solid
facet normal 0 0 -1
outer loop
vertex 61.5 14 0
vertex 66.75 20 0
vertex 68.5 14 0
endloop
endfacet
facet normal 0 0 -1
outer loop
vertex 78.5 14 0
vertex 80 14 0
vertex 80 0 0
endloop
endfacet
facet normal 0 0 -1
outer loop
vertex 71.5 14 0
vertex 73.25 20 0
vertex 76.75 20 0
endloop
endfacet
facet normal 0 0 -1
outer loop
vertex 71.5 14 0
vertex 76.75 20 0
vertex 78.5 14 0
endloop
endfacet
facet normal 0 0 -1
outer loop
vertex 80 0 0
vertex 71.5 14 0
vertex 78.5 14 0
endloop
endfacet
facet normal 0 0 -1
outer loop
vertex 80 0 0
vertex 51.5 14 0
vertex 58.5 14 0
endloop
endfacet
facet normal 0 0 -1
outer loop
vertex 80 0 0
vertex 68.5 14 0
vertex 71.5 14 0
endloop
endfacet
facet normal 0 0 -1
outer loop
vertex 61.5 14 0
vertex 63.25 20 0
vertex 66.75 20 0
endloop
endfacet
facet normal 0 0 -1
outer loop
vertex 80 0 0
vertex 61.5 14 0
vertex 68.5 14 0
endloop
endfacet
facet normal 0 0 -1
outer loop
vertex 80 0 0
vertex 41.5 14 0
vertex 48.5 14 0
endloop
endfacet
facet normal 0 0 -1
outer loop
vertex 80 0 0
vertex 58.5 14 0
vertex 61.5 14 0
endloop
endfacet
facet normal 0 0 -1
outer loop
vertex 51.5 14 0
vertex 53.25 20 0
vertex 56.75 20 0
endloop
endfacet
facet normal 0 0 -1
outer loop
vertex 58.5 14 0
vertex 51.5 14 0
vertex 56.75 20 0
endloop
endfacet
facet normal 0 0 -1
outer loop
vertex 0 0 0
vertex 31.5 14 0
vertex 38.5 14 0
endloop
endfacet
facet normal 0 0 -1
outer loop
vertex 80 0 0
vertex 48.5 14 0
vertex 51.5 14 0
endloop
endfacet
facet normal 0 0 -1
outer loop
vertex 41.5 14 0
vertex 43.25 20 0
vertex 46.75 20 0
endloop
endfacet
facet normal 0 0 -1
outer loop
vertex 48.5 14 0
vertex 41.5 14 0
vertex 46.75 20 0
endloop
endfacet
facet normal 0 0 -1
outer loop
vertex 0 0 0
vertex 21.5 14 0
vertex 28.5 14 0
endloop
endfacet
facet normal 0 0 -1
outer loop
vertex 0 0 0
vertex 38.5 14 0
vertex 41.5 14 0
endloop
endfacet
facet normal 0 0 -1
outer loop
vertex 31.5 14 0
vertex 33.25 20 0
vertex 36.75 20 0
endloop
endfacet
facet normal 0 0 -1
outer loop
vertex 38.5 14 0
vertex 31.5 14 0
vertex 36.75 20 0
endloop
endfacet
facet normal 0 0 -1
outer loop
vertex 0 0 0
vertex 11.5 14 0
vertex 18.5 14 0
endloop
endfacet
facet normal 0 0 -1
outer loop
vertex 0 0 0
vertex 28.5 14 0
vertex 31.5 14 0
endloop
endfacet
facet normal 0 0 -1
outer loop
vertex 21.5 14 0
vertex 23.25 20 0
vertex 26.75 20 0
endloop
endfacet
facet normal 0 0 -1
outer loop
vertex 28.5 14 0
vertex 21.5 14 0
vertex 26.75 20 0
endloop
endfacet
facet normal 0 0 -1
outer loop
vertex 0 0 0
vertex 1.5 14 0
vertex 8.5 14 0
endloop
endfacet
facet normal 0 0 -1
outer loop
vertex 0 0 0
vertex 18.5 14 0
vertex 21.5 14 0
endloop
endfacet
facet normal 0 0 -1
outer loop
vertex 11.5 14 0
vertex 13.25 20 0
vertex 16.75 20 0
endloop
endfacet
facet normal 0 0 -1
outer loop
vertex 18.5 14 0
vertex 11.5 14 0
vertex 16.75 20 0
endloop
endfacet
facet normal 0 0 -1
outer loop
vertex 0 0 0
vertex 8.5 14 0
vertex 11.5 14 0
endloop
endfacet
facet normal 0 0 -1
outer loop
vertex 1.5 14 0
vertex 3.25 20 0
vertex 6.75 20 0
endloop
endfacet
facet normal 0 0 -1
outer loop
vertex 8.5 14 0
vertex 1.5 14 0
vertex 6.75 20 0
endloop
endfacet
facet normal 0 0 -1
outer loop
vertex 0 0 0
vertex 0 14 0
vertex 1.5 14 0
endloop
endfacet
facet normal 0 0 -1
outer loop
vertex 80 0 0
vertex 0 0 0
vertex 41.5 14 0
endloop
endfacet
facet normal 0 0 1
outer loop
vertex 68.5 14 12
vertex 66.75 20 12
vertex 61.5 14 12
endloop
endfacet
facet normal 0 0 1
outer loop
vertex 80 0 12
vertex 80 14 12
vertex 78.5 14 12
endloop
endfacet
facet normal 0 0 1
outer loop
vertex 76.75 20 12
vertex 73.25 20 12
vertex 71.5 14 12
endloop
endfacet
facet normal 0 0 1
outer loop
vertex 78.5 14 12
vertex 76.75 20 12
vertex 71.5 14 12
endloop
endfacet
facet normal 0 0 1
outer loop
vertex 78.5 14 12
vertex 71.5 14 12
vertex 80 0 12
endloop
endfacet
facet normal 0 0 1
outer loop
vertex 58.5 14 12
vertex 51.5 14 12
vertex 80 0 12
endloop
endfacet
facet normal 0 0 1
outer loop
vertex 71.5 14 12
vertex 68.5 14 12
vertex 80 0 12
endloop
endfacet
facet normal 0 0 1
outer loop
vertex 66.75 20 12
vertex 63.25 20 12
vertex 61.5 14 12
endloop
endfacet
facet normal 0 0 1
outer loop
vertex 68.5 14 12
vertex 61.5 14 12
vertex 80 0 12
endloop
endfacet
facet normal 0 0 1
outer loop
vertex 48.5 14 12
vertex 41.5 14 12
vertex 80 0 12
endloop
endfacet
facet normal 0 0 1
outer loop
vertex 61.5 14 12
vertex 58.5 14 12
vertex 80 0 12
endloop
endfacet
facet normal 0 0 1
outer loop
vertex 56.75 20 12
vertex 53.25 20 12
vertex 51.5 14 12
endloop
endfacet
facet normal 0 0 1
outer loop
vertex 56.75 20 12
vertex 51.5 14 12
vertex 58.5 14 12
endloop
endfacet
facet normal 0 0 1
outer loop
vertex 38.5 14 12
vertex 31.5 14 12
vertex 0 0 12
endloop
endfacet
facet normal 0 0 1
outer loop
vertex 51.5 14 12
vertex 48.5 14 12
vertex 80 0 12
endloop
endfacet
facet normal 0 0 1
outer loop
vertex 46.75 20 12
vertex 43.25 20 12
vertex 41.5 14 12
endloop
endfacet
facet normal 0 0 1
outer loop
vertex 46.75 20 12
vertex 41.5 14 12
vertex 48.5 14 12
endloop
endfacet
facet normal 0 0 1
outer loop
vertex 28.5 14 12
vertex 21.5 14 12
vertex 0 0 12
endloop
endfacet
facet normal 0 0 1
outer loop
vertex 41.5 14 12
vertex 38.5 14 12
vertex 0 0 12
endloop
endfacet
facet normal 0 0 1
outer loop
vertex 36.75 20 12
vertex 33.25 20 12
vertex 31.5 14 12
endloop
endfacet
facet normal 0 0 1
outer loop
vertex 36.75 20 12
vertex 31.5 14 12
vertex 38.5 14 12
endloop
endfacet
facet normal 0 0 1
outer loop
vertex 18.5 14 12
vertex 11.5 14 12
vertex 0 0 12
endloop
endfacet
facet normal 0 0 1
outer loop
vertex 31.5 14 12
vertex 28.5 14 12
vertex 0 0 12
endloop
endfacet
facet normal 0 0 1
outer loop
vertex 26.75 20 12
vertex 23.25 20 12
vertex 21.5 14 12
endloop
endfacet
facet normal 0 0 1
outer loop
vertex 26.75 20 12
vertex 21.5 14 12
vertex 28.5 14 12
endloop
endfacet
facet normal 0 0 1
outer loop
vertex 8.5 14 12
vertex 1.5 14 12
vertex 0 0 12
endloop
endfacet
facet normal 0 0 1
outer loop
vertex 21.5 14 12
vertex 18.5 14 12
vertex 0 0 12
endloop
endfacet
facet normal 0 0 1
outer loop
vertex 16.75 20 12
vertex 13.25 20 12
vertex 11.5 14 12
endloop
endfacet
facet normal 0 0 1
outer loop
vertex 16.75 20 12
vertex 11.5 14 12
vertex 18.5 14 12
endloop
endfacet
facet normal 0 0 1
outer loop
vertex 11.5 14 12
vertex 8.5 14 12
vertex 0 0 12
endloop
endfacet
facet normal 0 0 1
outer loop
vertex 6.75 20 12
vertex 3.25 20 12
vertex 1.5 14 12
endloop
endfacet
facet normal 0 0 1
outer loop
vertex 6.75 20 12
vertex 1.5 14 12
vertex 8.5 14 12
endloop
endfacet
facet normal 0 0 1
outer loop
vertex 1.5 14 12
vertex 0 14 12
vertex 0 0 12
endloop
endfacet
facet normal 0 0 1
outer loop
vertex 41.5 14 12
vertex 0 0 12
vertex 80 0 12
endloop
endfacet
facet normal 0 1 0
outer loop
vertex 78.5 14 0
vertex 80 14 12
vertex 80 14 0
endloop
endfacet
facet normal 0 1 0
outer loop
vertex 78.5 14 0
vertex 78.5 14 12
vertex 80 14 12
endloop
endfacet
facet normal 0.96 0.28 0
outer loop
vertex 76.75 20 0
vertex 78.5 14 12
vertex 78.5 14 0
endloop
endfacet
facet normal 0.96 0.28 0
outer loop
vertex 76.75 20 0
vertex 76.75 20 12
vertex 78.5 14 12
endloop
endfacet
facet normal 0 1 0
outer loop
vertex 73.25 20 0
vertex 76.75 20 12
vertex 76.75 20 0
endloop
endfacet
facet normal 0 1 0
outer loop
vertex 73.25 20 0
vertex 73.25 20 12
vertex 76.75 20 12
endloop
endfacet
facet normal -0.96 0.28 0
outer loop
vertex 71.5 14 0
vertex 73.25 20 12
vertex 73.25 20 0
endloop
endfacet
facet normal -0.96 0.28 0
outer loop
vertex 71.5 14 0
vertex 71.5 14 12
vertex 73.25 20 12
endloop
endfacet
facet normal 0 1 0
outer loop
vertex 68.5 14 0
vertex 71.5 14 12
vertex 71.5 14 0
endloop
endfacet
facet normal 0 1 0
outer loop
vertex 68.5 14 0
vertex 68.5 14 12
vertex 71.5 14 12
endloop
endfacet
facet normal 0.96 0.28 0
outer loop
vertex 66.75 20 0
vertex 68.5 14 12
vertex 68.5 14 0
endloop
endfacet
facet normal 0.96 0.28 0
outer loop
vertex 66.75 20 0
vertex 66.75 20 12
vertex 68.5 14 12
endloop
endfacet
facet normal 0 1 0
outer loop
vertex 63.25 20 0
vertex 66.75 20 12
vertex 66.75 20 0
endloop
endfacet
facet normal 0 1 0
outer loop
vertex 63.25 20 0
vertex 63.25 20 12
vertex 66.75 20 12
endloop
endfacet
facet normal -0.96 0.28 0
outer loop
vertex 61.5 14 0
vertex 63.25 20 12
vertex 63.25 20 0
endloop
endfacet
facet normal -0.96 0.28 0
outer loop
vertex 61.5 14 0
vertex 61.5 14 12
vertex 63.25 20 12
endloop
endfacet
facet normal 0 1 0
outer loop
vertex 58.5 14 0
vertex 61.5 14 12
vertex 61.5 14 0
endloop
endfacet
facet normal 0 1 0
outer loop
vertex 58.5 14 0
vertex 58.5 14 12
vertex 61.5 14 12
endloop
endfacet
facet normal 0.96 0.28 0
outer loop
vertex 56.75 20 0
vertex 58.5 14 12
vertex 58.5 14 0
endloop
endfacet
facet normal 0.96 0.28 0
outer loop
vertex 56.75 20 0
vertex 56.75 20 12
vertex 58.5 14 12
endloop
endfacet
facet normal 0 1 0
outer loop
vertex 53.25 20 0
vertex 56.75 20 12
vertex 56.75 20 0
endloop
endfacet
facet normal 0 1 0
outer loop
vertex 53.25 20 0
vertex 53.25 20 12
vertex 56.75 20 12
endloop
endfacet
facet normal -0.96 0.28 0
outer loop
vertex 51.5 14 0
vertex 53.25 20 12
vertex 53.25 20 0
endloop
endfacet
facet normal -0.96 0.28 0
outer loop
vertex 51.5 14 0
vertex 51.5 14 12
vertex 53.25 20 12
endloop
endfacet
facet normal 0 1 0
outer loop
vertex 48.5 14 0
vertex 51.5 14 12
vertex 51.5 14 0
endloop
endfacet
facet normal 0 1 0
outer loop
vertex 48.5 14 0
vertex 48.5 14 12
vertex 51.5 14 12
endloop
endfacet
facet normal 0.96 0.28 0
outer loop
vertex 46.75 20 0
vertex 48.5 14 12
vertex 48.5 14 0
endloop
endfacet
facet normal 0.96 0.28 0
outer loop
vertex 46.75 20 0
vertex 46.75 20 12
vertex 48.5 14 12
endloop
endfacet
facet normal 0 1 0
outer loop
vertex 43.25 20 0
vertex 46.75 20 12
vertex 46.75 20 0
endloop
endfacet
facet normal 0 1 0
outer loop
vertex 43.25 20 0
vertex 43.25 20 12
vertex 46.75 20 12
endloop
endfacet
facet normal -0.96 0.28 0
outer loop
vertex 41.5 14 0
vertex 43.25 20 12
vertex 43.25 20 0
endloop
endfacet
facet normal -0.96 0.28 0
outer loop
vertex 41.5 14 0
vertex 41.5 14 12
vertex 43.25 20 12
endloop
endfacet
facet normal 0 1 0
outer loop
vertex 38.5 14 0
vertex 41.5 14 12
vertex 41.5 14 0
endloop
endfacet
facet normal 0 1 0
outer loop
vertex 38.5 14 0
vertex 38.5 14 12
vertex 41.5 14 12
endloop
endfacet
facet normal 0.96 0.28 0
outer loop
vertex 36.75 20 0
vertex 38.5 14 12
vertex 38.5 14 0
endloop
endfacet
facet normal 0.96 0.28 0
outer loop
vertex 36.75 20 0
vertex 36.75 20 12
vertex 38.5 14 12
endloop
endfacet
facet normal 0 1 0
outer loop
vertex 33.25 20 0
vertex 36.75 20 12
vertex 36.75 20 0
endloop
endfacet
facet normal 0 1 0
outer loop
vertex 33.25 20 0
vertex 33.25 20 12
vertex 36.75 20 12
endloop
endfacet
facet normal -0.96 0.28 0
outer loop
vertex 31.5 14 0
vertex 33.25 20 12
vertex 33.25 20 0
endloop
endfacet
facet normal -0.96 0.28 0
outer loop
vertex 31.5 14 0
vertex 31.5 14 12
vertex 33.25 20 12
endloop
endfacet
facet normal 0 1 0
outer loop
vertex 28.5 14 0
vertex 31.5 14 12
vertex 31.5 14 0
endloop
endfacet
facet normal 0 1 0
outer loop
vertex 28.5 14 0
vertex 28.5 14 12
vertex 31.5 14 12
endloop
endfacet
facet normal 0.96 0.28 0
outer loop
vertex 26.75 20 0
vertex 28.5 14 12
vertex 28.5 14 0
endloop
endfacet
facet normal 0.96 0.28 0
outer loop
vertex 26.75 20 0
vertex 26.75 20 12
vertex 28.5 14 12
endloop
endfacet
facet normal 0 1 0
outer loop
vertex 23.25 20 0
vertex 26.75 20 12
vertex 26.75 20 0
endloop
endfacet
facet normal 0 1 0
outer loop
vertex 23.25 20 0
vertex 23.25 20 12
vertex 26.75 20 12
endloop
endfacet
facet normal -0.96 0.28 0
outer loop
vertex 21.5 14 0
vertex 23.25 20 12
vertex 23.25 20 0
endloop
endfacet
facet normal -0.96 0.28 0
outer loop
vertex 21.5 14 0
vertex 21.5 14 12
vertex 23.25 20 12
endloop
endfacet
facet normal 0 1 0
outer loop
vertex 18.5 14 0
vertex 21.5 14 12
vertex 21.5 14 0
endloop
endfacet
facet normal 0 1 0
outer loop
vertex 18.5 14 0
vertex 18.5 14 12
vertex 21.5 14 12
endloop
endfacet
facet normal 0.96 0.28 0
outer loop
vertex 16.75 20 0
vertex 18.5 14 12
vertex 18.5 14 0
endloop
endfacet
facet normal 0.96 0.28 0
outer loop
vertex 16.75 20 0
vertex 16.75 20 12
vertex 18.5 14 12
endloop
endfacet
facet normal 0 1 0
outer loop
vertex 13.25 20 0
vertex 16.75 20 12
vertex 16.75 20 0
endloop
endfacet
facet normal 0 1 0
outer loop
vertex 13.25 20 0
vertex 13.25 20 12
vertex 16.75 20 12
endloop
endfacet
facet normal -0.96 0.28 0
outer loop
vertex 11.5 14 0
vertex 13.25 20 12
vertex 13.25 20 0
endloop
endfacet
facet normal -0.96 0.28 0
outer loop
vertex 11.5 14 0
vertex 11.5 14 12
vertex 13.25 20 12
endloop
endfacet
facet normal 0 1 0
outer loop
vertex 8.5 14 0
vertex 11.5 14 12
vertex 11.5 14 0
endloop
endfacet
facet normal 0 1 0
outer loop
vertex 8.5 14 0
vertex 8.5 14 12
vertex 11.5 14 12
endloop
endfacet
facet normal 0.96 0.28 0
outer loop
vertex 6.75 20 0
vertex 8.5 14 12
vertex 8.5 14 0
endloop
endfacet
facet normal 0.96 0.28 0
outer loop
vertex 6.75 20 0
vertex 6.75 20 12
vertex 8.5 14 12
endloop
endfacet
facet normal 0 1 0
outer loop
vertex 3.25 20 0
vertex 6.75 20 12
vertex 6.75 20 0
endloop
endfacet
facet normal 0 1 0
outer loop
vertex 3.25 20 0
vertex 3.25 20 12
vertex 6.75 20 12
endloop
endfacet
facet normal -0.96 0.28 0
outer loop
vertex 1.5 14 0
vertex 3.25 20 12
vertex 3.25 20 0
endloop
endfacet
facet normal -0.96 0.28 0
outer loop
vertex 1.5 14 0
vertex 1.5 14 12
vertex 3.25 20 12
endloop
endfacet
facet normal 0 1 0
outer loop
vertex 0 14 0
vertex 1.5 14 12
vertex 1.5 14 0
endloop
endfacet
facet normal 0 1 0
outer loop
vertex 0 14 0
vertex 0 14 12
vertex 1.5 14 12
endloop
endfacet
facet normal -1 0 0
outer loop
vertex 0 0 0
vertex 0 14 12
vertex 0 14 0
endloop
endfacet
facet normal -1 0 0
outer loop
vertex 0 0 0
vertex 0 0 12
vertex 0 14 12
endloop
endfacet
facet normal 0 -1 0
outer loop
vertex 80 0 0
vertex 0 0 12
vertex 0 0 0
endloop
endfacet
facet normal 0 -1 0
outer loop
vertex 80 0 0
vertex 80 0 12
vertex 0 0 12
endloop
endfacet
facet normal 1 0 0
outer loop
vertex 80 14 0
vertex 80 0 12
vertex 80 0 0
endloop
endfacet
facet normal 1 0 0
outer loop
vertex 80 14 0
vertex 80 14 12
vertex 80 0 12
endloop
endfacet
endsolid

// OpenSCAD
$fn = 32;

// ----------------------------------------------------------------------
// Gear rack: 8 teeth, pitch 10 mm
// ----------------------------------------------------------------------

// --- parameters (mm) ---
teeth = 8;                // number of teeth
pitch = 10;               // tooth pitch, X
root_w = 7;               // tooth width at the root
tip_w = 3.5;              // tooth width at the tip
base_h = 14;              // rack body height, Y
tooth_h = 6;              // tooth height above the body
plate_t = 12;             // rack width, Z (extrusion height)

rack_l = teeth * pitch;  // overall length
total_h = base_h + tooth_h;  // overall height

profile = [[0, 0], [80, 0], [80, 14], [78.5, 14], [76.75, 20], [73.25, 20], [71.5, 14], [68.5, 14], [66.75, 20], [63.25, 20], [61.5, 14], [58.5, 14], [56.75, 20], [53.25, 20], [51.5, 14], [48.5, 14], [46.75, 20], [43.25, 20], [41.5, 14], [38.5, 14], [36.75, 20], [33.25, 20], [31.5, 14], [28.5, 14], [26.75, 20], [23.25, 20], [21.5, 14], [18.5, 14], [16.75, 20], [13.25, 20], [11.5, 14], [8.5, 14], [6.75, 20], [3.25, 20], [1.5, 14], [0, 14]];  // primary outline, 36 points, counter clockwise

// --- the one profile operation ---
linear_extrude(height = plate_t) polygon(points = profile);
